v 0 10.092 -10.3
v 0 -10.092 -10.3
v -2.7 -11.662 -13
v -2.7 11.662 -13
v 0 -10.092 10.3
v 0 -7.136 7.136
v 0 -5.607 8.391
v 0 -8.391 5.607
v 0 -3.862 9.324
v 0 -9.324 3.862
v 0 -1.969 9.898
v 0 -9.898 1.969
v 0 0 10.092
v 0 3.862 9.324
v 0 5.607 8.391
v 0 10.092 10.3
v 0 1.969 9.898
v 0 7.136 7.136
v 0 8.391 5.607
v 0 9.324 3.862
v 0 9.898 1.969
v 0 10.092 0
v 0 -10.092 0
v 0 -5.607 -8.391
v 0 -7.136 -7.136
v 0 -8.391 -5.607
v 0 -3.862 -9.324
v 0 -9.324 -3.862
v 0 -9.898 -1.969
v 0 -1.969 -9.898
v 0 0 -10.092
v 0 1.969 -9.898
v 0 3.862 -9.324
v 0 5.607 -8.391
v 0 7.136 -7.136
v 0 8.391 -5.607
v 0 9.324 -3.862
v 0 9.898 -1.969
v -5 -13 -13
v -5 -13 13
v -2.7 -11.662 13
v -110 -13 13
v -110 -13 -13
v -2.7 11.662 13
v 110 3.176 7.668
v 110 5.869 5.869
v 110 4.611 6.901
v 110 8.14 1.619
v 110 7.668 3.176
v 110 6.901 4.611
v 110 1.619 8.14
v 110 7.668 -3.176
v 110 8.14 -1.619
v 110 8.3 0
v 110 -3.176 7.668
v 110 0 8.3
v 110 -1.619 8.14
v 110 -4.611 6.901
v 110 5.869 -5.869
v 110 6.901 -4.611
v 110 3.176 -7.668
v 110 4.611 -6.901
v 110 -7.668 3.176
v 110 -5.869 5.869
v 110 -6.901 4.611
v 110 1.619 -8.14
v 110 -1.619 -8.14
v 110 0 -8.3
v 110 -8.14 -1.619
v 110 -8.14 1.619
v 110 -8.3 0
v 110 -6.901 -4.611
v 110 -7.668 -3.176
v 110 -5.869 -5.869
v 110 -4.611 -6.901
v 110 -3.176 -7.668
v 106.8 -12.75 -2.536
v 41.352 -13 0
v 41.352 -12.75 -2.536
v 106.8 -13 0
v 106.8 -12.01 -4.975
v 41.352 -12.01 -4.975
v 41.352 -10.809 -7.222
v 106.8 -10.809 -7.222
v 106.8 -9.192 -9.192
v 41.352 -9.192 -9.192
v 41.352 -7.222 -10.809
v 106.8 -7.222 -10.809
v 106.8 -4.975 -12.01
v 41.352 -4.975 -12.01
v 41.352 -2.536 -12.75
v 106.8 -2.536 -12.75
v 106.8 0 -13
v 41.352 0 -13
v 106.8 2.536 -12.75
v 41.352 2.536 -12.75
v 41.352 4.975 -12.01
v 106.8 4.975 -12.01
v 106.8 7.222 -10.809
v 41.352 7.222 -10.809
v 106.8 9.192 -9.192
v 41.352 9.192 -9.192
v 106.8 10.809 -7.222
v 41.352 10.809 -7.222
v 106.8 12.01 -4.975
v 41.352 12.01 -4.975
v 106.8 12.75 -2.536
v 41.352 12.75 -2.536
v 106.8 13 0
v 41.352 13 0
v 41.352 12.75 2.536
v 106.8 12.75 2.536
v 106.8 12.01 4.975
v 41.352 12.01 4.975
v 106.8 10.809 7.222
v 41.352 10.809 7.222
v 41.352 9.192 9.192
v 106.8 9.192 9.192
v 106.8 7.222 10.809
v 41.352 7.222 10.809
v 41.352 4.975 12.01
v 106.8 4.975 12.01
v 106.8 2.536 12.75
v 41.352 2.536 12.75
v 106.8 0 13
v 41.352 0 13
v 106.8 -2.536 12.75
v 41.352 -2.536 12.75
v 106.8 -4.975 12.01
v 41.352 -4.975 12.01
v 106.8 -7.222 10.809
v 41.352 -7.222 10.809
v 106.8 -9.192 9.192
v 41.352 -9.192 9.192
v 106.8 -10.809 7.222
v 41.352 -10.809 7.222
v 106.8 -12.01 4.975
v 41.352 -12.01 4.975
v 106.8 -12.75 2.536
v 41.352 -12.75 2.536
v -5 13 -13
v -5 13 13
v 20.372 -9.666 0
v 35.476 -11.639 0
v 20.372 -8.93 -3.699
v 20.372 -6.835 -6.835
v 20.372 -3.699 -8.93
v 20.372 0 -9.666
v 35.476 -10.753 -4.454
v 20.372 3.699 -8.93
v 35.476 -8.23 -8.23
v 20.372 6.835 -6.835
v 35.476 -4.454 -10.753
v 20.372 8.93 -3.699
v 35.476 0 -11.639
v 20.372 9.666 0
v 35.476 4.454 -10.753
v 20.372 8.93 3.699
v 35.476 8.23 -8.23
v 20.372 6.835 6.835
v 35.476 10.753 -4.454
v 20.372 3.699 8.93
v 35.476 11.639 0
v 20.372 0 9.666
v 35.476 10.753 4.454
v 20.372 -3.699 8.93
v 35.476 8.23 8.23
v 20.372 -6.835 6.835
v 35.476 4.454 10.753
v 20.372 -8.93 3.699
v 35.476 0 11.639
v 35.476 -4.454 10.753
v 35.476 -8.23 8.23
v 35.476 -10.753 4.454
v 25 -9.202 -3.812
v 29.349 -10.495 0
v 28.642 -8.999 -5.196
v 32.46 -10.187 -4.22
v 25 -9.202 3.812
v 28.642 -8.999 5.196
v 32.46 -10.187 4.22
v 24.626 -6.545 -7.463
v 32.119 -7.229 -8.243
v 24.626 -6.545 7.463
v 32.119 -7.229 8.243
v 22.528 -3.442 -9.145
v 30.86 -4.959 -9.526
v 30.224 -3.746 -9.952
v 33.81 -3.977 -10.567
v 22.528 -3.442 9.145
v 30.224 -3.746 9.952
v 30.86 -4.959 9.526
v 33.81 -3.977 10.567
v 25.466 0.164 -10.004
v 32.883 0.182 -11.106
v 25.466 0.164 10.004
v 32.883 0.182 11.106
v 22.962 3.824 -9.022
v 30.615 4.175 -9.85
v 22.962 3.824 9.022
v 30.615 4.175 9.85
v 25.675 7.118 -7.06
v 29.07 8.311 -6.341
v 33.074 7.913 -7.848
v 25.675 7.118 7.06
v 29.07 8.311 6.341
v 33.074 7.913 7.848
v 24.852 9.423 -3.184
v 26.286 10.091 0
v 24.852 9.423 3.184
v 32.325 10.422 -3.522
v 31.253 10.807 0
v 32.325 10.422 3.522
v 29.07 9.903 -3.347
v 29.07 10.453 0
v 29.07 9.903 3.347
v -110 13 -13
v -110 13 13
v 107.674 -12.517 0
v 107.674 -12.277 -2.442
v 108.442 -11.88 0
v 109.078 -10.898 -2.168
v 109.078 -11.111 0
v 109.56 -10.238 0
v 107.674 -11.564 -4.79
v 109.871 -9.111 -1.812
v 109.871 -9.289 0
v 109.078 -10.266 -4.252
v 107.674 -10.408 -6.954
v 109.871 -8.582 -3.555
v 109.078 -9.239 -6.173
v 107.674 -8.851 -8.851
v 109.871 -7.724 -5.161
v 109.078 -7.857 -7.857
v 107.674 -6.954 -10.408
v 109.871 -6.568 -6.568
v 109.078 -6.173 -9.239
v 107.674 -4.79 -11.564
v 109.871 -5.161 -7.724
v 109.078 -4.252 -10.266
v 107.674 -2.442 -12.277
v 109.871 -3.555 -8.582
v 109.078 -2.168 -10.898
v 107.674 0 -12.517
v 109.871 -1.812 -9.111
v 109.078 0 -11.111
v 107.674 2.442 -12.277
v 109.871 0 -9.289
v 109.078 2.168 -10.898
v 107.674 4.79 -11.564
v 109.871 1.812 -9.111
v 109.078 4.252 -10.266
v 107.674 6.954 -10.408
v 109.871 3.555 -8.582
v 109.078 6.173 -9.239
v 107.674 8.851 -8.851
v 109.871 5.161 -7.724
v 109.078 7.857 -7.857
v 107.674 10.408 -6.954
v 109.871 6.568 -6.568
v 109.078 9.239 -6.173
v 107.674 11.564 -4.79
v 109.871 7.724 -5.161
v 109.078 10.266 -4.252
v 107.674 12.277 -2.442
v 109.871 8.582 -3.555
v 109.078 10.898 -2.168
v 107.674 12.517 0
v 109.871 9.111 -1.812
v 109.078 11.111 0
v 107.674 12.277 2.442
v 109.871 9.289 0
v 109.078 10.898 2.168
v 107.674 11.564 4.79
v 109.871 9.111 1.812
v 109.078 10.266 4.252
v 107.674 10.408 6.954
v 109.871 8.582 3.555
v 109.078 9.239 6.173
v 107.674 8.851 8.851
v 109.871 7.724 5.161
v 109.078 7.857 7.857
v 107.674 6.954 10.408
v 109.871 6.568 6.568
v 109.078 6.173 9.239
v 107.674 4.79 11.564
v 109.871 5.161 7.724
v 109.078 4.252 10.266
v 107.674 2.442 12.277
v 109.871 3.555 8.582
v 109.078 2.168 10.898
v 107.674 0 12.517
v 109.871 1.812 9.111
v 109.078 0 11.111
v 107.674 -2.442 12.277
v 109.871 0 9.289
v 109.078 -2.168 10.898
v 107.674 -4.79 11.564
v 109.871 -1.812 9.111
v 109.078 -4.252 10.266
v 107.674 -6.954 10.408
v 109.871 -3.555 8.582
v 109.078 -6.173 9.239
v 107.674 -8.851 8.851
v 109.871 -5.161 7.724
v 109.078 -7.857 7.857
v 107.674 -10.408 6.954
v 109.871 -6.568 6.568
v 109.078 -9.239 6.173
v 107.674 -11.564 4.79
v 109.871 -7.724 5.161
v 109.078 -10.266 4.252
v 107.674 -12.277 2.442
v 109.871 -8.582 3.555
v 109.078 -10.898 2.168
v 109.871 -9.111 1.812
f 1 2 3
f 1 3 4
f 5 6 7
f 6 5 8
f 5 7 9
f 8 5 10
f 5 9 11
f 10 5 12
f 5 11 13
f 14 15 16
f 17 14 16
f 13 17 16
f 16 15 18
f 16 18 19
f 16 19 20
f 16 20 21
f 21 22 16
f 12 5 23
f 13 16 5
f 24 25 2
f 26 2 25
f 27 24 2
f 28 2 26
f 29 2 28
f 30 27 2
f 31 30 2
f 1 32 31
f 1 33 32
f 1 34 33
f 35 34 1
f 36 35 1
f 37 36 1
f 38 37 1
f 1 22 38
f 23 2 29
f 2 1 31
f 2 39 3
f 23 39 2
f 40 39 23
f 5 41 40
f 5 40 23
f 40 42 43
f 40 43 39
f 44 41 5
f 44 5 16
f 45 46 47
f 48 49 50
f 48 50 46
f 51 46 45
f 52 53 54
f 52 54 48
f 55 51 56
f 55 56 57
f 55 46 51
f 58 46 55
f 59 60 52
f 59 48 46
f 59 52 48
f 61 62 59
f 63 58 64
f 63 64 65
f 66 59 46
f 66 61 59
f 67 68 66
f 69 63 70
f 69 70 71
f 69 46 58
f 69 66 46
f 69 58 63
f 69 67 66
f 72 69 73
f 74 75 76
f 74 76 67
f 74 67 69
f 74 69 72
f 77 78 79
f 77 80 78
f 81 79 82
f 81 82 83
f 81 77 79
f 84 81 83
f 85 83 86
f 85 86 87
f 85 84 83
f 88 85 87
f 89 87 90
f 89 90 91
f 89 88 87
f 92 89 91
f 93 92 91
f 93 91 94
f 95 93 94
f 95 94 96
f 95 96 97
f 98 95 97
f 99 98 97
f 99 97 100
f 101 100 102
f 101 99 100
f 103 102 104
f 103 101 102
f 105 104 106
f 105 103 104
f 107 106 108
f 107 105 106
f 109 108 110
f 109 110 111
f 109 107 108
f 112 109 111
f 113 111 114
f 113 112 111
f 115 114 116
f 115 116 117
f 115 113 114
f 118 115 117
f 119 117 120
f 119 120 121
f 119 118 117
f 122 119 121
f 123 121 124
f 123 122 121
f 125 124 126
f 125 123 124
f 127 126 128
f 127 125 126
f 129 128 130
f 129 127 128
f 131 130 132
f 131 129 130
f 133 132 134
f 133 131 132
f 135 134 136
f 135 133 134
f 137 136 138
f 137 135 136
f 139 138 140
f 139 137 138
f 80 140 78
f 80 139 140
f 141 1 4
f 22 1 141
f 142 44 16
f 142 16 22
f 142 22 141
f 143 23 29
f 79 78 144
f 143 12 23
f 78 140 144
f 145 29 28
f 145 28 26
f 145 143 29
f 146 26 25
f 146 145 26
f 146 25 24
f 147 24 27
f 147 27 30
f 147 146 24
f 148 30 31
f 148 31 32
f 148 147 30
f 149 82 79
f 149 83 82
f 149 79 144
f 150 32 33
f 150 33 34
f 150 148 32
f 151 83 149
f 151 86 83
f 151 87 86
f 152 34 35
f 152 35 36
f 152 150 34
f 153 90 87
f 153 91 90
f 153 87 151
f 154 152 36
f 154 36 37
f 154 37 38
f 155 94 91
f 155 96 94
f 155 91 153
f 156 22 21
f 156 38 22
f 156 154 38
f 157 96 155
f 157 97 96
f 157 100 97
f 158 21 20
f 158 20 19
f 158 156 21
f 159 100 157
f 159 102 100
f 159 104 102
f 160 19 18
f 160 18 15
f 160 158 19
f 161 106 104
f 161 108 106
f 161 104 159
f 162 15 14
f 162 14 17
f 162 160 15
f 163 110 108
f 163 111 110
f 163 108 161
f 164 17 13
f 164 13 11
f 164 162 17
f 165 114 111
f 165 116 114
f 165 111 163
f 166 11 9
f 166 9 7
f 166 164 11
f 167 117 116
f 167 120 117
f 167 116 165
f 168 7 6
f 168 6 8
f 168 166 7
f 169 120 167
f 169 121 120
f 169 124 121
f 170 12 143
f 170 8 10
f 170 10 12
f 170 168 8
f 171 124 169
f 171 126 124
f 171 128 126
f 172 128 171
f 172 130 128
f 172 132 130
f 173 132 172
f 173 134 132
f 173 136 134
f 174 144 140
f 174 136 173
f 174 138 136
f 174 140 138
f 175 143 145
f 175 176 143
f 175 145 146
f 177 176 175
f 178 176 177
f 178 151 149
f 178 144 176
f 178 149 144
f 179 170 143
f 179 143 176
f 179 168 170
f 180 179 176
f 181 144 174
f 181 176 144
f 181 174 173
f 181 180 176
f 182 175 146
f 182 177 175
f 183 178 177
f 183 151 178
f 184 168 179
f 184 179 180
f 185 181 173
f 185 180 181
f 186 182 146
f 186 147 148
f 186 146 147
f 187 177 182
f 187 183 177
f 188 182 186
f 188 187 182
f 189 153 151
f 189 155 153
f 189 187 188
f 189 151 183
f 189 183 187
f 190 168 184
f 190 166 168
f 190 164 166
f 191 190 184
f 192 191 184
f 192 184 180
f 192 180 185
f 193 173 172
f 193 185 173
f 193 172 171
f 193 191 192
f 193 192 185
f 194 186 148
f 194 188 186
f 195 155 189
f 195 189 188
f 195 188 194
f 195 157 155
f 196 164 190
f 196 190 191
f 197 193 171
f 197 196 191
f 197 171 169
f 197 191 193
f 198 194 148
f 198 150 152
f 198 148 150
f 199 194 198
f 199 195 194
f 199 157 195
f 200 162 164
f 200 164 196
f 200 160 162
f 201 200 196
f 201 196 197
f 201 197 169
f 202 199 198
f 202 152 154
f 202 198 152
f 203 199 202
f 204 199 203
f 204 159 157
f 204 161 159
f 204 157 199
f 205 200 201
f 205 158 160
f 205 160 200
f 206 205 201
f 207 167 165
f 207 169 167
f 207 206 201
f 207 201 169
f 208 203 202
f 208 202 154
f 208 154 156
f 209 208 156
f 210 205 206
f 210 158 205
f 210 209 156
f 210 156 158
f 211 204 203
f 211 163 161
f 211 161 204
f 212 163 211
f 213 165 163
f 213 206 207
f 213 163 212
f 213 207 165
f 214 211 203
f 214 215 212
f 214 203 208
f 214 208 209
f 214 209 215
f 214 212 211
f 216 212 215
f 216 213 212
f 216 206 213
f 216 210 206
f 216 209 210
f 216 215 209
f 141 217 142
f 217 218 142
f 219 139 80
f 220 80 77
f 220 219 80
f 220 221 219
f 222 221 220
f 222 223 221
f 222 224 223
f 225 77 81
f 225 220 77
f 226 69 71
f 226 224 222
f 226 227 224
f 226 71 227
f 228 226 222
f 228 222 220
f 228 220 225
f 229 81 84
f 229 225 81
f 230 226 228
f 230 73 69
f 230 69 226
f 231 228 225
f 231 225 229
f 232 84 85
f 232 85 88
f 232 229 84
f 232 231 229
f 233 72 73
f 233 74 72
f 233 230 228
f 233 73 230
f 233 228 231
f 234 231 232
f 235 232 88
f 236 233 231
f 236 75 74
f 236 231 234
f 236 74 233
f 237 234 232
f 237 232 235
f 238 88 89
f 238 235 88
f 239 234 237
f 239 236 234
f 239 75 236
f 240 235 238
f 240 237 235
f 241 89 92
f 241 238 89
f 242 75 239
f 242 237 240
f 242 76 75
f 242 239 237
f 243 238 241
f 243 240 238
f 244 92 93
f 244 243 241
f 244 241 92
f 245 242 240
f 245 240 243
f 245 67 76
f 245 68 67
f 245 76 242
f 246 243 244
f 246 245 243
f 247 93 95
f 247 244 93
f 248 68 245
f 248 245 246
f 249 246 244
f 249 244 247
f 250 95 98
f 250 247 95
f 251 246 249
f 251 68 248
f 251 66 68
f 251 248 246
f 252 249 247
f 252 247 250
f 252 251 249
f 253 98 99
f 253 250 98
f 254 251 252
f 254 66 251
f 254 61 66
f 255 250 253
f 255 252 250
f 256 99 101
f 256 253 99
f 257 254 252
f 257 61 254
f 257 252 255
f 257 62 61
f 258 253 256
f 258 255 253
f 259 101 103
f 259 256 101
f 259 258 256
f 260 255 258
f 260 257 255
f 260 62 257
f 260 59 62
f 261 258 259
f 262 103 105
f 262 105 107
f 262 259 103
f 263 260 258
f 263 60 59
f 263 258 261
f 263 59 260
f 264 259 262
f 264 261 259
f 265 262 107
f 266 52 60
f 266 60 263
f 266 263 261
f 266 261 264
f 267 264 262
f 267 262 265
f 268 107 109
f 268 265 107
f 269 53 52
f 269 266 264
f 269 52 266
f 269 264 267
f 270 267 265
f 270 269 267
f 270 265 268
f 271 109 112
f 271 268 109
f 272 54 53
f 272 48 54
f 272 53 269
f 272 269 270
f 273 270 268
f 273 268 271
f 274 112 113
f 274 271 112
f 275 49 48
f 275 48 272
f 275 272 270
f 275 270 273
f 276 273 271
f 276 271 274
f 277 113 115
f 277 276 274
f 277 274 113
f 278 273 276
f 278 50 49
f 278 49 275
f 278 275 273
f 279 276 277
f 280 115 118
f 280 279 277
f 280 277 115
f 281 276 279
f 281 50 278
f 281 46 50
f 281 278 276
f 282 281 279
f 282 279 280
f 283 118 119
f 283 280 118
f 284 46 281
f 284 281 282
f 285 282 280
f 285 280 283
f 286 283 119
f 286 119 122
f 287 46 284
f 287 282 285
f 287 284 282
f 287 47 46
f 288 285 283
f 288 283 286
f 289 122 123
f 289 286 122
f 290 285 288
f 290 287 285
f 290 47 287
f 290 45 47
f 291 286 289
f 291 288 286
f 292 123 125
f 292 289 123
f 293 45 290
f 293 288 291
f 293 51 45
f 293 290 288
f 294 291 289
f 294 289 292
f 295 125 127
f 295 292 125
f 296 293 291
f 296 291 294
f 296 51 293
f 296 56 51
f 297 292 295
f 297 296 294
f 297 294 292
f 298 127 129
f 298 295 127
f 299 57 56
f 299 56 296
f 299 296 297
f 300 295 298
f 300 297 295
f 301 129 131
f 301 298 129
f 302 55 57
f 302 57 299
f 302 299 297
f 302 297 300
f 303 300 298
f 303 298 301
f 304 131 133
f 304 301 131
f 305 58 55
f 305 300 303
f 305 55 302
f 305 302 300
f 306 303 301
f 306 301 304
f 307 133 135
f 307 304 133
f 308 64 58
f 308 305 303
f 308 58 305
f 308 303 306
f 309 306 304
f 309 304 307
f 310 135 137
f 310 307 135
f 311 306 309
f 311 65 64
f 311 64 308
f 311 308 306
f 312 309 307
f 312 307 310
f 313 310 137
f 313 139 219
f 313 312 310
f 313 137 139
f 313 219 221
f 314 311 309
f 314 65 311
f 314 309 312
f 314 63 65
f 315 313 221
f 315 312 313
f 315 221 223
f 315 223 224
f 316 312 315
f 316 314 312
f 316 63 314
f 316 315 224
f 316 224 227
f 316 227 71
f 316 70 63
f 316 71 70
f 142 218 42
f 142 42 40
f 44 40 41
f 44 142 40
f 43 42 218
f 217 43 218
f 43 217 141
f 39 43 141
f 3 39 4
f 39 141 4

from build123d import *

# Parameters (mm, degrees)
F0_W     = 105
F0_H     = 26
F2_DEPTH = 13
F3_DEPTH = 13
F4_DEPTH = 13
F5_DEPTH = 13
F6_SIZE  = 2.7
F7_SIZE  = 2.7


with BuildPart() as f1:
    # F0 (on Top) → F1 (revolve)
    with BuildSketch(Plane.XY):
        with BuildLine():
            Line((110, 0), (0, 0))
            Line((0, 0), (0, -10.0923664868))
            add(Edge.make_bspline(
                [(0, -10.0923664868), (8.6124591201, -9.6848175395), (24.3863467012, -8.9383836594), (36.054630575, -11.7317822521), (41.3520932198, -13)],
                knots=[0, 0, 0, 0, 0.5459947065, 1, 1, 1, 1], degree=3))
            Line((41.3520932198, -13), (106.8001613021, -13))
            ThreePointArc((106.8001613021, -13), (109.0781586072, -11.1114138074), (110, -8.2996104758))
            Line((110, -8.2996104758), (110, -7.9163433984))
            Line((110, -7.9163433984), (110, 0))
        make_face()
    revolve(axis=Axis((55, 0, 0), (1, 0, 0)))



with BuildPart() as f2:
    # F0 (on Top) → F2 (new body)
    with BuildSketch(Plane.XY):
        with Locations((-57.5, 0)):
            Rectangle(F0_W, F0_H)
    extrude(amount=F2_DEPTH)

    # F3 (add): a face of the model
    f3_faces = [f2.faces().sort_by_distance(p)[0] for p in [
        (-57.5, 0, 0),
    ]]
    extrude(f3_faces, amount=F3_DEPTH)


with BuildPart() as f4:
    # F0 (on Top) → F4 (new body)
    with BuildSketch(Plane.XY):
        Polygon((0, 0), (0, 10.0923664868), (-5, 13), (-5, -13), (0, -10.0923664868), align=None)
    extrude(amount=F4_DEPTH)


with BuildPart() as f1_1:
    add(f1.part)
    # F5 (add): a face of the model
    f5_faces = [f4.part.faces().sort_by_distance(p)[0] for p in [
        (-2.6049276578, 0, 0),
    ]]

    add(f2.part)  # F5 merges F2

    add(f4.part)  # F5 merges F4
    extrude(f5_faces, amount=F5_DEPTH)

    # F6
    f6_edges = [f1_1.edges().sort_by_distance(p)[0] for p in [
        (0, 0, 13),
    ]]
    chamfer(f6_edges, length=F6_SIZE)

    # F7
    f7_edges = [f1_1.edges().sort_by_distance(p)[0] for p in [
        (0, 0, -13),
    ]]
    chamfer(f7_edges, length=F7_SIZE)


solid = f1_1.part
